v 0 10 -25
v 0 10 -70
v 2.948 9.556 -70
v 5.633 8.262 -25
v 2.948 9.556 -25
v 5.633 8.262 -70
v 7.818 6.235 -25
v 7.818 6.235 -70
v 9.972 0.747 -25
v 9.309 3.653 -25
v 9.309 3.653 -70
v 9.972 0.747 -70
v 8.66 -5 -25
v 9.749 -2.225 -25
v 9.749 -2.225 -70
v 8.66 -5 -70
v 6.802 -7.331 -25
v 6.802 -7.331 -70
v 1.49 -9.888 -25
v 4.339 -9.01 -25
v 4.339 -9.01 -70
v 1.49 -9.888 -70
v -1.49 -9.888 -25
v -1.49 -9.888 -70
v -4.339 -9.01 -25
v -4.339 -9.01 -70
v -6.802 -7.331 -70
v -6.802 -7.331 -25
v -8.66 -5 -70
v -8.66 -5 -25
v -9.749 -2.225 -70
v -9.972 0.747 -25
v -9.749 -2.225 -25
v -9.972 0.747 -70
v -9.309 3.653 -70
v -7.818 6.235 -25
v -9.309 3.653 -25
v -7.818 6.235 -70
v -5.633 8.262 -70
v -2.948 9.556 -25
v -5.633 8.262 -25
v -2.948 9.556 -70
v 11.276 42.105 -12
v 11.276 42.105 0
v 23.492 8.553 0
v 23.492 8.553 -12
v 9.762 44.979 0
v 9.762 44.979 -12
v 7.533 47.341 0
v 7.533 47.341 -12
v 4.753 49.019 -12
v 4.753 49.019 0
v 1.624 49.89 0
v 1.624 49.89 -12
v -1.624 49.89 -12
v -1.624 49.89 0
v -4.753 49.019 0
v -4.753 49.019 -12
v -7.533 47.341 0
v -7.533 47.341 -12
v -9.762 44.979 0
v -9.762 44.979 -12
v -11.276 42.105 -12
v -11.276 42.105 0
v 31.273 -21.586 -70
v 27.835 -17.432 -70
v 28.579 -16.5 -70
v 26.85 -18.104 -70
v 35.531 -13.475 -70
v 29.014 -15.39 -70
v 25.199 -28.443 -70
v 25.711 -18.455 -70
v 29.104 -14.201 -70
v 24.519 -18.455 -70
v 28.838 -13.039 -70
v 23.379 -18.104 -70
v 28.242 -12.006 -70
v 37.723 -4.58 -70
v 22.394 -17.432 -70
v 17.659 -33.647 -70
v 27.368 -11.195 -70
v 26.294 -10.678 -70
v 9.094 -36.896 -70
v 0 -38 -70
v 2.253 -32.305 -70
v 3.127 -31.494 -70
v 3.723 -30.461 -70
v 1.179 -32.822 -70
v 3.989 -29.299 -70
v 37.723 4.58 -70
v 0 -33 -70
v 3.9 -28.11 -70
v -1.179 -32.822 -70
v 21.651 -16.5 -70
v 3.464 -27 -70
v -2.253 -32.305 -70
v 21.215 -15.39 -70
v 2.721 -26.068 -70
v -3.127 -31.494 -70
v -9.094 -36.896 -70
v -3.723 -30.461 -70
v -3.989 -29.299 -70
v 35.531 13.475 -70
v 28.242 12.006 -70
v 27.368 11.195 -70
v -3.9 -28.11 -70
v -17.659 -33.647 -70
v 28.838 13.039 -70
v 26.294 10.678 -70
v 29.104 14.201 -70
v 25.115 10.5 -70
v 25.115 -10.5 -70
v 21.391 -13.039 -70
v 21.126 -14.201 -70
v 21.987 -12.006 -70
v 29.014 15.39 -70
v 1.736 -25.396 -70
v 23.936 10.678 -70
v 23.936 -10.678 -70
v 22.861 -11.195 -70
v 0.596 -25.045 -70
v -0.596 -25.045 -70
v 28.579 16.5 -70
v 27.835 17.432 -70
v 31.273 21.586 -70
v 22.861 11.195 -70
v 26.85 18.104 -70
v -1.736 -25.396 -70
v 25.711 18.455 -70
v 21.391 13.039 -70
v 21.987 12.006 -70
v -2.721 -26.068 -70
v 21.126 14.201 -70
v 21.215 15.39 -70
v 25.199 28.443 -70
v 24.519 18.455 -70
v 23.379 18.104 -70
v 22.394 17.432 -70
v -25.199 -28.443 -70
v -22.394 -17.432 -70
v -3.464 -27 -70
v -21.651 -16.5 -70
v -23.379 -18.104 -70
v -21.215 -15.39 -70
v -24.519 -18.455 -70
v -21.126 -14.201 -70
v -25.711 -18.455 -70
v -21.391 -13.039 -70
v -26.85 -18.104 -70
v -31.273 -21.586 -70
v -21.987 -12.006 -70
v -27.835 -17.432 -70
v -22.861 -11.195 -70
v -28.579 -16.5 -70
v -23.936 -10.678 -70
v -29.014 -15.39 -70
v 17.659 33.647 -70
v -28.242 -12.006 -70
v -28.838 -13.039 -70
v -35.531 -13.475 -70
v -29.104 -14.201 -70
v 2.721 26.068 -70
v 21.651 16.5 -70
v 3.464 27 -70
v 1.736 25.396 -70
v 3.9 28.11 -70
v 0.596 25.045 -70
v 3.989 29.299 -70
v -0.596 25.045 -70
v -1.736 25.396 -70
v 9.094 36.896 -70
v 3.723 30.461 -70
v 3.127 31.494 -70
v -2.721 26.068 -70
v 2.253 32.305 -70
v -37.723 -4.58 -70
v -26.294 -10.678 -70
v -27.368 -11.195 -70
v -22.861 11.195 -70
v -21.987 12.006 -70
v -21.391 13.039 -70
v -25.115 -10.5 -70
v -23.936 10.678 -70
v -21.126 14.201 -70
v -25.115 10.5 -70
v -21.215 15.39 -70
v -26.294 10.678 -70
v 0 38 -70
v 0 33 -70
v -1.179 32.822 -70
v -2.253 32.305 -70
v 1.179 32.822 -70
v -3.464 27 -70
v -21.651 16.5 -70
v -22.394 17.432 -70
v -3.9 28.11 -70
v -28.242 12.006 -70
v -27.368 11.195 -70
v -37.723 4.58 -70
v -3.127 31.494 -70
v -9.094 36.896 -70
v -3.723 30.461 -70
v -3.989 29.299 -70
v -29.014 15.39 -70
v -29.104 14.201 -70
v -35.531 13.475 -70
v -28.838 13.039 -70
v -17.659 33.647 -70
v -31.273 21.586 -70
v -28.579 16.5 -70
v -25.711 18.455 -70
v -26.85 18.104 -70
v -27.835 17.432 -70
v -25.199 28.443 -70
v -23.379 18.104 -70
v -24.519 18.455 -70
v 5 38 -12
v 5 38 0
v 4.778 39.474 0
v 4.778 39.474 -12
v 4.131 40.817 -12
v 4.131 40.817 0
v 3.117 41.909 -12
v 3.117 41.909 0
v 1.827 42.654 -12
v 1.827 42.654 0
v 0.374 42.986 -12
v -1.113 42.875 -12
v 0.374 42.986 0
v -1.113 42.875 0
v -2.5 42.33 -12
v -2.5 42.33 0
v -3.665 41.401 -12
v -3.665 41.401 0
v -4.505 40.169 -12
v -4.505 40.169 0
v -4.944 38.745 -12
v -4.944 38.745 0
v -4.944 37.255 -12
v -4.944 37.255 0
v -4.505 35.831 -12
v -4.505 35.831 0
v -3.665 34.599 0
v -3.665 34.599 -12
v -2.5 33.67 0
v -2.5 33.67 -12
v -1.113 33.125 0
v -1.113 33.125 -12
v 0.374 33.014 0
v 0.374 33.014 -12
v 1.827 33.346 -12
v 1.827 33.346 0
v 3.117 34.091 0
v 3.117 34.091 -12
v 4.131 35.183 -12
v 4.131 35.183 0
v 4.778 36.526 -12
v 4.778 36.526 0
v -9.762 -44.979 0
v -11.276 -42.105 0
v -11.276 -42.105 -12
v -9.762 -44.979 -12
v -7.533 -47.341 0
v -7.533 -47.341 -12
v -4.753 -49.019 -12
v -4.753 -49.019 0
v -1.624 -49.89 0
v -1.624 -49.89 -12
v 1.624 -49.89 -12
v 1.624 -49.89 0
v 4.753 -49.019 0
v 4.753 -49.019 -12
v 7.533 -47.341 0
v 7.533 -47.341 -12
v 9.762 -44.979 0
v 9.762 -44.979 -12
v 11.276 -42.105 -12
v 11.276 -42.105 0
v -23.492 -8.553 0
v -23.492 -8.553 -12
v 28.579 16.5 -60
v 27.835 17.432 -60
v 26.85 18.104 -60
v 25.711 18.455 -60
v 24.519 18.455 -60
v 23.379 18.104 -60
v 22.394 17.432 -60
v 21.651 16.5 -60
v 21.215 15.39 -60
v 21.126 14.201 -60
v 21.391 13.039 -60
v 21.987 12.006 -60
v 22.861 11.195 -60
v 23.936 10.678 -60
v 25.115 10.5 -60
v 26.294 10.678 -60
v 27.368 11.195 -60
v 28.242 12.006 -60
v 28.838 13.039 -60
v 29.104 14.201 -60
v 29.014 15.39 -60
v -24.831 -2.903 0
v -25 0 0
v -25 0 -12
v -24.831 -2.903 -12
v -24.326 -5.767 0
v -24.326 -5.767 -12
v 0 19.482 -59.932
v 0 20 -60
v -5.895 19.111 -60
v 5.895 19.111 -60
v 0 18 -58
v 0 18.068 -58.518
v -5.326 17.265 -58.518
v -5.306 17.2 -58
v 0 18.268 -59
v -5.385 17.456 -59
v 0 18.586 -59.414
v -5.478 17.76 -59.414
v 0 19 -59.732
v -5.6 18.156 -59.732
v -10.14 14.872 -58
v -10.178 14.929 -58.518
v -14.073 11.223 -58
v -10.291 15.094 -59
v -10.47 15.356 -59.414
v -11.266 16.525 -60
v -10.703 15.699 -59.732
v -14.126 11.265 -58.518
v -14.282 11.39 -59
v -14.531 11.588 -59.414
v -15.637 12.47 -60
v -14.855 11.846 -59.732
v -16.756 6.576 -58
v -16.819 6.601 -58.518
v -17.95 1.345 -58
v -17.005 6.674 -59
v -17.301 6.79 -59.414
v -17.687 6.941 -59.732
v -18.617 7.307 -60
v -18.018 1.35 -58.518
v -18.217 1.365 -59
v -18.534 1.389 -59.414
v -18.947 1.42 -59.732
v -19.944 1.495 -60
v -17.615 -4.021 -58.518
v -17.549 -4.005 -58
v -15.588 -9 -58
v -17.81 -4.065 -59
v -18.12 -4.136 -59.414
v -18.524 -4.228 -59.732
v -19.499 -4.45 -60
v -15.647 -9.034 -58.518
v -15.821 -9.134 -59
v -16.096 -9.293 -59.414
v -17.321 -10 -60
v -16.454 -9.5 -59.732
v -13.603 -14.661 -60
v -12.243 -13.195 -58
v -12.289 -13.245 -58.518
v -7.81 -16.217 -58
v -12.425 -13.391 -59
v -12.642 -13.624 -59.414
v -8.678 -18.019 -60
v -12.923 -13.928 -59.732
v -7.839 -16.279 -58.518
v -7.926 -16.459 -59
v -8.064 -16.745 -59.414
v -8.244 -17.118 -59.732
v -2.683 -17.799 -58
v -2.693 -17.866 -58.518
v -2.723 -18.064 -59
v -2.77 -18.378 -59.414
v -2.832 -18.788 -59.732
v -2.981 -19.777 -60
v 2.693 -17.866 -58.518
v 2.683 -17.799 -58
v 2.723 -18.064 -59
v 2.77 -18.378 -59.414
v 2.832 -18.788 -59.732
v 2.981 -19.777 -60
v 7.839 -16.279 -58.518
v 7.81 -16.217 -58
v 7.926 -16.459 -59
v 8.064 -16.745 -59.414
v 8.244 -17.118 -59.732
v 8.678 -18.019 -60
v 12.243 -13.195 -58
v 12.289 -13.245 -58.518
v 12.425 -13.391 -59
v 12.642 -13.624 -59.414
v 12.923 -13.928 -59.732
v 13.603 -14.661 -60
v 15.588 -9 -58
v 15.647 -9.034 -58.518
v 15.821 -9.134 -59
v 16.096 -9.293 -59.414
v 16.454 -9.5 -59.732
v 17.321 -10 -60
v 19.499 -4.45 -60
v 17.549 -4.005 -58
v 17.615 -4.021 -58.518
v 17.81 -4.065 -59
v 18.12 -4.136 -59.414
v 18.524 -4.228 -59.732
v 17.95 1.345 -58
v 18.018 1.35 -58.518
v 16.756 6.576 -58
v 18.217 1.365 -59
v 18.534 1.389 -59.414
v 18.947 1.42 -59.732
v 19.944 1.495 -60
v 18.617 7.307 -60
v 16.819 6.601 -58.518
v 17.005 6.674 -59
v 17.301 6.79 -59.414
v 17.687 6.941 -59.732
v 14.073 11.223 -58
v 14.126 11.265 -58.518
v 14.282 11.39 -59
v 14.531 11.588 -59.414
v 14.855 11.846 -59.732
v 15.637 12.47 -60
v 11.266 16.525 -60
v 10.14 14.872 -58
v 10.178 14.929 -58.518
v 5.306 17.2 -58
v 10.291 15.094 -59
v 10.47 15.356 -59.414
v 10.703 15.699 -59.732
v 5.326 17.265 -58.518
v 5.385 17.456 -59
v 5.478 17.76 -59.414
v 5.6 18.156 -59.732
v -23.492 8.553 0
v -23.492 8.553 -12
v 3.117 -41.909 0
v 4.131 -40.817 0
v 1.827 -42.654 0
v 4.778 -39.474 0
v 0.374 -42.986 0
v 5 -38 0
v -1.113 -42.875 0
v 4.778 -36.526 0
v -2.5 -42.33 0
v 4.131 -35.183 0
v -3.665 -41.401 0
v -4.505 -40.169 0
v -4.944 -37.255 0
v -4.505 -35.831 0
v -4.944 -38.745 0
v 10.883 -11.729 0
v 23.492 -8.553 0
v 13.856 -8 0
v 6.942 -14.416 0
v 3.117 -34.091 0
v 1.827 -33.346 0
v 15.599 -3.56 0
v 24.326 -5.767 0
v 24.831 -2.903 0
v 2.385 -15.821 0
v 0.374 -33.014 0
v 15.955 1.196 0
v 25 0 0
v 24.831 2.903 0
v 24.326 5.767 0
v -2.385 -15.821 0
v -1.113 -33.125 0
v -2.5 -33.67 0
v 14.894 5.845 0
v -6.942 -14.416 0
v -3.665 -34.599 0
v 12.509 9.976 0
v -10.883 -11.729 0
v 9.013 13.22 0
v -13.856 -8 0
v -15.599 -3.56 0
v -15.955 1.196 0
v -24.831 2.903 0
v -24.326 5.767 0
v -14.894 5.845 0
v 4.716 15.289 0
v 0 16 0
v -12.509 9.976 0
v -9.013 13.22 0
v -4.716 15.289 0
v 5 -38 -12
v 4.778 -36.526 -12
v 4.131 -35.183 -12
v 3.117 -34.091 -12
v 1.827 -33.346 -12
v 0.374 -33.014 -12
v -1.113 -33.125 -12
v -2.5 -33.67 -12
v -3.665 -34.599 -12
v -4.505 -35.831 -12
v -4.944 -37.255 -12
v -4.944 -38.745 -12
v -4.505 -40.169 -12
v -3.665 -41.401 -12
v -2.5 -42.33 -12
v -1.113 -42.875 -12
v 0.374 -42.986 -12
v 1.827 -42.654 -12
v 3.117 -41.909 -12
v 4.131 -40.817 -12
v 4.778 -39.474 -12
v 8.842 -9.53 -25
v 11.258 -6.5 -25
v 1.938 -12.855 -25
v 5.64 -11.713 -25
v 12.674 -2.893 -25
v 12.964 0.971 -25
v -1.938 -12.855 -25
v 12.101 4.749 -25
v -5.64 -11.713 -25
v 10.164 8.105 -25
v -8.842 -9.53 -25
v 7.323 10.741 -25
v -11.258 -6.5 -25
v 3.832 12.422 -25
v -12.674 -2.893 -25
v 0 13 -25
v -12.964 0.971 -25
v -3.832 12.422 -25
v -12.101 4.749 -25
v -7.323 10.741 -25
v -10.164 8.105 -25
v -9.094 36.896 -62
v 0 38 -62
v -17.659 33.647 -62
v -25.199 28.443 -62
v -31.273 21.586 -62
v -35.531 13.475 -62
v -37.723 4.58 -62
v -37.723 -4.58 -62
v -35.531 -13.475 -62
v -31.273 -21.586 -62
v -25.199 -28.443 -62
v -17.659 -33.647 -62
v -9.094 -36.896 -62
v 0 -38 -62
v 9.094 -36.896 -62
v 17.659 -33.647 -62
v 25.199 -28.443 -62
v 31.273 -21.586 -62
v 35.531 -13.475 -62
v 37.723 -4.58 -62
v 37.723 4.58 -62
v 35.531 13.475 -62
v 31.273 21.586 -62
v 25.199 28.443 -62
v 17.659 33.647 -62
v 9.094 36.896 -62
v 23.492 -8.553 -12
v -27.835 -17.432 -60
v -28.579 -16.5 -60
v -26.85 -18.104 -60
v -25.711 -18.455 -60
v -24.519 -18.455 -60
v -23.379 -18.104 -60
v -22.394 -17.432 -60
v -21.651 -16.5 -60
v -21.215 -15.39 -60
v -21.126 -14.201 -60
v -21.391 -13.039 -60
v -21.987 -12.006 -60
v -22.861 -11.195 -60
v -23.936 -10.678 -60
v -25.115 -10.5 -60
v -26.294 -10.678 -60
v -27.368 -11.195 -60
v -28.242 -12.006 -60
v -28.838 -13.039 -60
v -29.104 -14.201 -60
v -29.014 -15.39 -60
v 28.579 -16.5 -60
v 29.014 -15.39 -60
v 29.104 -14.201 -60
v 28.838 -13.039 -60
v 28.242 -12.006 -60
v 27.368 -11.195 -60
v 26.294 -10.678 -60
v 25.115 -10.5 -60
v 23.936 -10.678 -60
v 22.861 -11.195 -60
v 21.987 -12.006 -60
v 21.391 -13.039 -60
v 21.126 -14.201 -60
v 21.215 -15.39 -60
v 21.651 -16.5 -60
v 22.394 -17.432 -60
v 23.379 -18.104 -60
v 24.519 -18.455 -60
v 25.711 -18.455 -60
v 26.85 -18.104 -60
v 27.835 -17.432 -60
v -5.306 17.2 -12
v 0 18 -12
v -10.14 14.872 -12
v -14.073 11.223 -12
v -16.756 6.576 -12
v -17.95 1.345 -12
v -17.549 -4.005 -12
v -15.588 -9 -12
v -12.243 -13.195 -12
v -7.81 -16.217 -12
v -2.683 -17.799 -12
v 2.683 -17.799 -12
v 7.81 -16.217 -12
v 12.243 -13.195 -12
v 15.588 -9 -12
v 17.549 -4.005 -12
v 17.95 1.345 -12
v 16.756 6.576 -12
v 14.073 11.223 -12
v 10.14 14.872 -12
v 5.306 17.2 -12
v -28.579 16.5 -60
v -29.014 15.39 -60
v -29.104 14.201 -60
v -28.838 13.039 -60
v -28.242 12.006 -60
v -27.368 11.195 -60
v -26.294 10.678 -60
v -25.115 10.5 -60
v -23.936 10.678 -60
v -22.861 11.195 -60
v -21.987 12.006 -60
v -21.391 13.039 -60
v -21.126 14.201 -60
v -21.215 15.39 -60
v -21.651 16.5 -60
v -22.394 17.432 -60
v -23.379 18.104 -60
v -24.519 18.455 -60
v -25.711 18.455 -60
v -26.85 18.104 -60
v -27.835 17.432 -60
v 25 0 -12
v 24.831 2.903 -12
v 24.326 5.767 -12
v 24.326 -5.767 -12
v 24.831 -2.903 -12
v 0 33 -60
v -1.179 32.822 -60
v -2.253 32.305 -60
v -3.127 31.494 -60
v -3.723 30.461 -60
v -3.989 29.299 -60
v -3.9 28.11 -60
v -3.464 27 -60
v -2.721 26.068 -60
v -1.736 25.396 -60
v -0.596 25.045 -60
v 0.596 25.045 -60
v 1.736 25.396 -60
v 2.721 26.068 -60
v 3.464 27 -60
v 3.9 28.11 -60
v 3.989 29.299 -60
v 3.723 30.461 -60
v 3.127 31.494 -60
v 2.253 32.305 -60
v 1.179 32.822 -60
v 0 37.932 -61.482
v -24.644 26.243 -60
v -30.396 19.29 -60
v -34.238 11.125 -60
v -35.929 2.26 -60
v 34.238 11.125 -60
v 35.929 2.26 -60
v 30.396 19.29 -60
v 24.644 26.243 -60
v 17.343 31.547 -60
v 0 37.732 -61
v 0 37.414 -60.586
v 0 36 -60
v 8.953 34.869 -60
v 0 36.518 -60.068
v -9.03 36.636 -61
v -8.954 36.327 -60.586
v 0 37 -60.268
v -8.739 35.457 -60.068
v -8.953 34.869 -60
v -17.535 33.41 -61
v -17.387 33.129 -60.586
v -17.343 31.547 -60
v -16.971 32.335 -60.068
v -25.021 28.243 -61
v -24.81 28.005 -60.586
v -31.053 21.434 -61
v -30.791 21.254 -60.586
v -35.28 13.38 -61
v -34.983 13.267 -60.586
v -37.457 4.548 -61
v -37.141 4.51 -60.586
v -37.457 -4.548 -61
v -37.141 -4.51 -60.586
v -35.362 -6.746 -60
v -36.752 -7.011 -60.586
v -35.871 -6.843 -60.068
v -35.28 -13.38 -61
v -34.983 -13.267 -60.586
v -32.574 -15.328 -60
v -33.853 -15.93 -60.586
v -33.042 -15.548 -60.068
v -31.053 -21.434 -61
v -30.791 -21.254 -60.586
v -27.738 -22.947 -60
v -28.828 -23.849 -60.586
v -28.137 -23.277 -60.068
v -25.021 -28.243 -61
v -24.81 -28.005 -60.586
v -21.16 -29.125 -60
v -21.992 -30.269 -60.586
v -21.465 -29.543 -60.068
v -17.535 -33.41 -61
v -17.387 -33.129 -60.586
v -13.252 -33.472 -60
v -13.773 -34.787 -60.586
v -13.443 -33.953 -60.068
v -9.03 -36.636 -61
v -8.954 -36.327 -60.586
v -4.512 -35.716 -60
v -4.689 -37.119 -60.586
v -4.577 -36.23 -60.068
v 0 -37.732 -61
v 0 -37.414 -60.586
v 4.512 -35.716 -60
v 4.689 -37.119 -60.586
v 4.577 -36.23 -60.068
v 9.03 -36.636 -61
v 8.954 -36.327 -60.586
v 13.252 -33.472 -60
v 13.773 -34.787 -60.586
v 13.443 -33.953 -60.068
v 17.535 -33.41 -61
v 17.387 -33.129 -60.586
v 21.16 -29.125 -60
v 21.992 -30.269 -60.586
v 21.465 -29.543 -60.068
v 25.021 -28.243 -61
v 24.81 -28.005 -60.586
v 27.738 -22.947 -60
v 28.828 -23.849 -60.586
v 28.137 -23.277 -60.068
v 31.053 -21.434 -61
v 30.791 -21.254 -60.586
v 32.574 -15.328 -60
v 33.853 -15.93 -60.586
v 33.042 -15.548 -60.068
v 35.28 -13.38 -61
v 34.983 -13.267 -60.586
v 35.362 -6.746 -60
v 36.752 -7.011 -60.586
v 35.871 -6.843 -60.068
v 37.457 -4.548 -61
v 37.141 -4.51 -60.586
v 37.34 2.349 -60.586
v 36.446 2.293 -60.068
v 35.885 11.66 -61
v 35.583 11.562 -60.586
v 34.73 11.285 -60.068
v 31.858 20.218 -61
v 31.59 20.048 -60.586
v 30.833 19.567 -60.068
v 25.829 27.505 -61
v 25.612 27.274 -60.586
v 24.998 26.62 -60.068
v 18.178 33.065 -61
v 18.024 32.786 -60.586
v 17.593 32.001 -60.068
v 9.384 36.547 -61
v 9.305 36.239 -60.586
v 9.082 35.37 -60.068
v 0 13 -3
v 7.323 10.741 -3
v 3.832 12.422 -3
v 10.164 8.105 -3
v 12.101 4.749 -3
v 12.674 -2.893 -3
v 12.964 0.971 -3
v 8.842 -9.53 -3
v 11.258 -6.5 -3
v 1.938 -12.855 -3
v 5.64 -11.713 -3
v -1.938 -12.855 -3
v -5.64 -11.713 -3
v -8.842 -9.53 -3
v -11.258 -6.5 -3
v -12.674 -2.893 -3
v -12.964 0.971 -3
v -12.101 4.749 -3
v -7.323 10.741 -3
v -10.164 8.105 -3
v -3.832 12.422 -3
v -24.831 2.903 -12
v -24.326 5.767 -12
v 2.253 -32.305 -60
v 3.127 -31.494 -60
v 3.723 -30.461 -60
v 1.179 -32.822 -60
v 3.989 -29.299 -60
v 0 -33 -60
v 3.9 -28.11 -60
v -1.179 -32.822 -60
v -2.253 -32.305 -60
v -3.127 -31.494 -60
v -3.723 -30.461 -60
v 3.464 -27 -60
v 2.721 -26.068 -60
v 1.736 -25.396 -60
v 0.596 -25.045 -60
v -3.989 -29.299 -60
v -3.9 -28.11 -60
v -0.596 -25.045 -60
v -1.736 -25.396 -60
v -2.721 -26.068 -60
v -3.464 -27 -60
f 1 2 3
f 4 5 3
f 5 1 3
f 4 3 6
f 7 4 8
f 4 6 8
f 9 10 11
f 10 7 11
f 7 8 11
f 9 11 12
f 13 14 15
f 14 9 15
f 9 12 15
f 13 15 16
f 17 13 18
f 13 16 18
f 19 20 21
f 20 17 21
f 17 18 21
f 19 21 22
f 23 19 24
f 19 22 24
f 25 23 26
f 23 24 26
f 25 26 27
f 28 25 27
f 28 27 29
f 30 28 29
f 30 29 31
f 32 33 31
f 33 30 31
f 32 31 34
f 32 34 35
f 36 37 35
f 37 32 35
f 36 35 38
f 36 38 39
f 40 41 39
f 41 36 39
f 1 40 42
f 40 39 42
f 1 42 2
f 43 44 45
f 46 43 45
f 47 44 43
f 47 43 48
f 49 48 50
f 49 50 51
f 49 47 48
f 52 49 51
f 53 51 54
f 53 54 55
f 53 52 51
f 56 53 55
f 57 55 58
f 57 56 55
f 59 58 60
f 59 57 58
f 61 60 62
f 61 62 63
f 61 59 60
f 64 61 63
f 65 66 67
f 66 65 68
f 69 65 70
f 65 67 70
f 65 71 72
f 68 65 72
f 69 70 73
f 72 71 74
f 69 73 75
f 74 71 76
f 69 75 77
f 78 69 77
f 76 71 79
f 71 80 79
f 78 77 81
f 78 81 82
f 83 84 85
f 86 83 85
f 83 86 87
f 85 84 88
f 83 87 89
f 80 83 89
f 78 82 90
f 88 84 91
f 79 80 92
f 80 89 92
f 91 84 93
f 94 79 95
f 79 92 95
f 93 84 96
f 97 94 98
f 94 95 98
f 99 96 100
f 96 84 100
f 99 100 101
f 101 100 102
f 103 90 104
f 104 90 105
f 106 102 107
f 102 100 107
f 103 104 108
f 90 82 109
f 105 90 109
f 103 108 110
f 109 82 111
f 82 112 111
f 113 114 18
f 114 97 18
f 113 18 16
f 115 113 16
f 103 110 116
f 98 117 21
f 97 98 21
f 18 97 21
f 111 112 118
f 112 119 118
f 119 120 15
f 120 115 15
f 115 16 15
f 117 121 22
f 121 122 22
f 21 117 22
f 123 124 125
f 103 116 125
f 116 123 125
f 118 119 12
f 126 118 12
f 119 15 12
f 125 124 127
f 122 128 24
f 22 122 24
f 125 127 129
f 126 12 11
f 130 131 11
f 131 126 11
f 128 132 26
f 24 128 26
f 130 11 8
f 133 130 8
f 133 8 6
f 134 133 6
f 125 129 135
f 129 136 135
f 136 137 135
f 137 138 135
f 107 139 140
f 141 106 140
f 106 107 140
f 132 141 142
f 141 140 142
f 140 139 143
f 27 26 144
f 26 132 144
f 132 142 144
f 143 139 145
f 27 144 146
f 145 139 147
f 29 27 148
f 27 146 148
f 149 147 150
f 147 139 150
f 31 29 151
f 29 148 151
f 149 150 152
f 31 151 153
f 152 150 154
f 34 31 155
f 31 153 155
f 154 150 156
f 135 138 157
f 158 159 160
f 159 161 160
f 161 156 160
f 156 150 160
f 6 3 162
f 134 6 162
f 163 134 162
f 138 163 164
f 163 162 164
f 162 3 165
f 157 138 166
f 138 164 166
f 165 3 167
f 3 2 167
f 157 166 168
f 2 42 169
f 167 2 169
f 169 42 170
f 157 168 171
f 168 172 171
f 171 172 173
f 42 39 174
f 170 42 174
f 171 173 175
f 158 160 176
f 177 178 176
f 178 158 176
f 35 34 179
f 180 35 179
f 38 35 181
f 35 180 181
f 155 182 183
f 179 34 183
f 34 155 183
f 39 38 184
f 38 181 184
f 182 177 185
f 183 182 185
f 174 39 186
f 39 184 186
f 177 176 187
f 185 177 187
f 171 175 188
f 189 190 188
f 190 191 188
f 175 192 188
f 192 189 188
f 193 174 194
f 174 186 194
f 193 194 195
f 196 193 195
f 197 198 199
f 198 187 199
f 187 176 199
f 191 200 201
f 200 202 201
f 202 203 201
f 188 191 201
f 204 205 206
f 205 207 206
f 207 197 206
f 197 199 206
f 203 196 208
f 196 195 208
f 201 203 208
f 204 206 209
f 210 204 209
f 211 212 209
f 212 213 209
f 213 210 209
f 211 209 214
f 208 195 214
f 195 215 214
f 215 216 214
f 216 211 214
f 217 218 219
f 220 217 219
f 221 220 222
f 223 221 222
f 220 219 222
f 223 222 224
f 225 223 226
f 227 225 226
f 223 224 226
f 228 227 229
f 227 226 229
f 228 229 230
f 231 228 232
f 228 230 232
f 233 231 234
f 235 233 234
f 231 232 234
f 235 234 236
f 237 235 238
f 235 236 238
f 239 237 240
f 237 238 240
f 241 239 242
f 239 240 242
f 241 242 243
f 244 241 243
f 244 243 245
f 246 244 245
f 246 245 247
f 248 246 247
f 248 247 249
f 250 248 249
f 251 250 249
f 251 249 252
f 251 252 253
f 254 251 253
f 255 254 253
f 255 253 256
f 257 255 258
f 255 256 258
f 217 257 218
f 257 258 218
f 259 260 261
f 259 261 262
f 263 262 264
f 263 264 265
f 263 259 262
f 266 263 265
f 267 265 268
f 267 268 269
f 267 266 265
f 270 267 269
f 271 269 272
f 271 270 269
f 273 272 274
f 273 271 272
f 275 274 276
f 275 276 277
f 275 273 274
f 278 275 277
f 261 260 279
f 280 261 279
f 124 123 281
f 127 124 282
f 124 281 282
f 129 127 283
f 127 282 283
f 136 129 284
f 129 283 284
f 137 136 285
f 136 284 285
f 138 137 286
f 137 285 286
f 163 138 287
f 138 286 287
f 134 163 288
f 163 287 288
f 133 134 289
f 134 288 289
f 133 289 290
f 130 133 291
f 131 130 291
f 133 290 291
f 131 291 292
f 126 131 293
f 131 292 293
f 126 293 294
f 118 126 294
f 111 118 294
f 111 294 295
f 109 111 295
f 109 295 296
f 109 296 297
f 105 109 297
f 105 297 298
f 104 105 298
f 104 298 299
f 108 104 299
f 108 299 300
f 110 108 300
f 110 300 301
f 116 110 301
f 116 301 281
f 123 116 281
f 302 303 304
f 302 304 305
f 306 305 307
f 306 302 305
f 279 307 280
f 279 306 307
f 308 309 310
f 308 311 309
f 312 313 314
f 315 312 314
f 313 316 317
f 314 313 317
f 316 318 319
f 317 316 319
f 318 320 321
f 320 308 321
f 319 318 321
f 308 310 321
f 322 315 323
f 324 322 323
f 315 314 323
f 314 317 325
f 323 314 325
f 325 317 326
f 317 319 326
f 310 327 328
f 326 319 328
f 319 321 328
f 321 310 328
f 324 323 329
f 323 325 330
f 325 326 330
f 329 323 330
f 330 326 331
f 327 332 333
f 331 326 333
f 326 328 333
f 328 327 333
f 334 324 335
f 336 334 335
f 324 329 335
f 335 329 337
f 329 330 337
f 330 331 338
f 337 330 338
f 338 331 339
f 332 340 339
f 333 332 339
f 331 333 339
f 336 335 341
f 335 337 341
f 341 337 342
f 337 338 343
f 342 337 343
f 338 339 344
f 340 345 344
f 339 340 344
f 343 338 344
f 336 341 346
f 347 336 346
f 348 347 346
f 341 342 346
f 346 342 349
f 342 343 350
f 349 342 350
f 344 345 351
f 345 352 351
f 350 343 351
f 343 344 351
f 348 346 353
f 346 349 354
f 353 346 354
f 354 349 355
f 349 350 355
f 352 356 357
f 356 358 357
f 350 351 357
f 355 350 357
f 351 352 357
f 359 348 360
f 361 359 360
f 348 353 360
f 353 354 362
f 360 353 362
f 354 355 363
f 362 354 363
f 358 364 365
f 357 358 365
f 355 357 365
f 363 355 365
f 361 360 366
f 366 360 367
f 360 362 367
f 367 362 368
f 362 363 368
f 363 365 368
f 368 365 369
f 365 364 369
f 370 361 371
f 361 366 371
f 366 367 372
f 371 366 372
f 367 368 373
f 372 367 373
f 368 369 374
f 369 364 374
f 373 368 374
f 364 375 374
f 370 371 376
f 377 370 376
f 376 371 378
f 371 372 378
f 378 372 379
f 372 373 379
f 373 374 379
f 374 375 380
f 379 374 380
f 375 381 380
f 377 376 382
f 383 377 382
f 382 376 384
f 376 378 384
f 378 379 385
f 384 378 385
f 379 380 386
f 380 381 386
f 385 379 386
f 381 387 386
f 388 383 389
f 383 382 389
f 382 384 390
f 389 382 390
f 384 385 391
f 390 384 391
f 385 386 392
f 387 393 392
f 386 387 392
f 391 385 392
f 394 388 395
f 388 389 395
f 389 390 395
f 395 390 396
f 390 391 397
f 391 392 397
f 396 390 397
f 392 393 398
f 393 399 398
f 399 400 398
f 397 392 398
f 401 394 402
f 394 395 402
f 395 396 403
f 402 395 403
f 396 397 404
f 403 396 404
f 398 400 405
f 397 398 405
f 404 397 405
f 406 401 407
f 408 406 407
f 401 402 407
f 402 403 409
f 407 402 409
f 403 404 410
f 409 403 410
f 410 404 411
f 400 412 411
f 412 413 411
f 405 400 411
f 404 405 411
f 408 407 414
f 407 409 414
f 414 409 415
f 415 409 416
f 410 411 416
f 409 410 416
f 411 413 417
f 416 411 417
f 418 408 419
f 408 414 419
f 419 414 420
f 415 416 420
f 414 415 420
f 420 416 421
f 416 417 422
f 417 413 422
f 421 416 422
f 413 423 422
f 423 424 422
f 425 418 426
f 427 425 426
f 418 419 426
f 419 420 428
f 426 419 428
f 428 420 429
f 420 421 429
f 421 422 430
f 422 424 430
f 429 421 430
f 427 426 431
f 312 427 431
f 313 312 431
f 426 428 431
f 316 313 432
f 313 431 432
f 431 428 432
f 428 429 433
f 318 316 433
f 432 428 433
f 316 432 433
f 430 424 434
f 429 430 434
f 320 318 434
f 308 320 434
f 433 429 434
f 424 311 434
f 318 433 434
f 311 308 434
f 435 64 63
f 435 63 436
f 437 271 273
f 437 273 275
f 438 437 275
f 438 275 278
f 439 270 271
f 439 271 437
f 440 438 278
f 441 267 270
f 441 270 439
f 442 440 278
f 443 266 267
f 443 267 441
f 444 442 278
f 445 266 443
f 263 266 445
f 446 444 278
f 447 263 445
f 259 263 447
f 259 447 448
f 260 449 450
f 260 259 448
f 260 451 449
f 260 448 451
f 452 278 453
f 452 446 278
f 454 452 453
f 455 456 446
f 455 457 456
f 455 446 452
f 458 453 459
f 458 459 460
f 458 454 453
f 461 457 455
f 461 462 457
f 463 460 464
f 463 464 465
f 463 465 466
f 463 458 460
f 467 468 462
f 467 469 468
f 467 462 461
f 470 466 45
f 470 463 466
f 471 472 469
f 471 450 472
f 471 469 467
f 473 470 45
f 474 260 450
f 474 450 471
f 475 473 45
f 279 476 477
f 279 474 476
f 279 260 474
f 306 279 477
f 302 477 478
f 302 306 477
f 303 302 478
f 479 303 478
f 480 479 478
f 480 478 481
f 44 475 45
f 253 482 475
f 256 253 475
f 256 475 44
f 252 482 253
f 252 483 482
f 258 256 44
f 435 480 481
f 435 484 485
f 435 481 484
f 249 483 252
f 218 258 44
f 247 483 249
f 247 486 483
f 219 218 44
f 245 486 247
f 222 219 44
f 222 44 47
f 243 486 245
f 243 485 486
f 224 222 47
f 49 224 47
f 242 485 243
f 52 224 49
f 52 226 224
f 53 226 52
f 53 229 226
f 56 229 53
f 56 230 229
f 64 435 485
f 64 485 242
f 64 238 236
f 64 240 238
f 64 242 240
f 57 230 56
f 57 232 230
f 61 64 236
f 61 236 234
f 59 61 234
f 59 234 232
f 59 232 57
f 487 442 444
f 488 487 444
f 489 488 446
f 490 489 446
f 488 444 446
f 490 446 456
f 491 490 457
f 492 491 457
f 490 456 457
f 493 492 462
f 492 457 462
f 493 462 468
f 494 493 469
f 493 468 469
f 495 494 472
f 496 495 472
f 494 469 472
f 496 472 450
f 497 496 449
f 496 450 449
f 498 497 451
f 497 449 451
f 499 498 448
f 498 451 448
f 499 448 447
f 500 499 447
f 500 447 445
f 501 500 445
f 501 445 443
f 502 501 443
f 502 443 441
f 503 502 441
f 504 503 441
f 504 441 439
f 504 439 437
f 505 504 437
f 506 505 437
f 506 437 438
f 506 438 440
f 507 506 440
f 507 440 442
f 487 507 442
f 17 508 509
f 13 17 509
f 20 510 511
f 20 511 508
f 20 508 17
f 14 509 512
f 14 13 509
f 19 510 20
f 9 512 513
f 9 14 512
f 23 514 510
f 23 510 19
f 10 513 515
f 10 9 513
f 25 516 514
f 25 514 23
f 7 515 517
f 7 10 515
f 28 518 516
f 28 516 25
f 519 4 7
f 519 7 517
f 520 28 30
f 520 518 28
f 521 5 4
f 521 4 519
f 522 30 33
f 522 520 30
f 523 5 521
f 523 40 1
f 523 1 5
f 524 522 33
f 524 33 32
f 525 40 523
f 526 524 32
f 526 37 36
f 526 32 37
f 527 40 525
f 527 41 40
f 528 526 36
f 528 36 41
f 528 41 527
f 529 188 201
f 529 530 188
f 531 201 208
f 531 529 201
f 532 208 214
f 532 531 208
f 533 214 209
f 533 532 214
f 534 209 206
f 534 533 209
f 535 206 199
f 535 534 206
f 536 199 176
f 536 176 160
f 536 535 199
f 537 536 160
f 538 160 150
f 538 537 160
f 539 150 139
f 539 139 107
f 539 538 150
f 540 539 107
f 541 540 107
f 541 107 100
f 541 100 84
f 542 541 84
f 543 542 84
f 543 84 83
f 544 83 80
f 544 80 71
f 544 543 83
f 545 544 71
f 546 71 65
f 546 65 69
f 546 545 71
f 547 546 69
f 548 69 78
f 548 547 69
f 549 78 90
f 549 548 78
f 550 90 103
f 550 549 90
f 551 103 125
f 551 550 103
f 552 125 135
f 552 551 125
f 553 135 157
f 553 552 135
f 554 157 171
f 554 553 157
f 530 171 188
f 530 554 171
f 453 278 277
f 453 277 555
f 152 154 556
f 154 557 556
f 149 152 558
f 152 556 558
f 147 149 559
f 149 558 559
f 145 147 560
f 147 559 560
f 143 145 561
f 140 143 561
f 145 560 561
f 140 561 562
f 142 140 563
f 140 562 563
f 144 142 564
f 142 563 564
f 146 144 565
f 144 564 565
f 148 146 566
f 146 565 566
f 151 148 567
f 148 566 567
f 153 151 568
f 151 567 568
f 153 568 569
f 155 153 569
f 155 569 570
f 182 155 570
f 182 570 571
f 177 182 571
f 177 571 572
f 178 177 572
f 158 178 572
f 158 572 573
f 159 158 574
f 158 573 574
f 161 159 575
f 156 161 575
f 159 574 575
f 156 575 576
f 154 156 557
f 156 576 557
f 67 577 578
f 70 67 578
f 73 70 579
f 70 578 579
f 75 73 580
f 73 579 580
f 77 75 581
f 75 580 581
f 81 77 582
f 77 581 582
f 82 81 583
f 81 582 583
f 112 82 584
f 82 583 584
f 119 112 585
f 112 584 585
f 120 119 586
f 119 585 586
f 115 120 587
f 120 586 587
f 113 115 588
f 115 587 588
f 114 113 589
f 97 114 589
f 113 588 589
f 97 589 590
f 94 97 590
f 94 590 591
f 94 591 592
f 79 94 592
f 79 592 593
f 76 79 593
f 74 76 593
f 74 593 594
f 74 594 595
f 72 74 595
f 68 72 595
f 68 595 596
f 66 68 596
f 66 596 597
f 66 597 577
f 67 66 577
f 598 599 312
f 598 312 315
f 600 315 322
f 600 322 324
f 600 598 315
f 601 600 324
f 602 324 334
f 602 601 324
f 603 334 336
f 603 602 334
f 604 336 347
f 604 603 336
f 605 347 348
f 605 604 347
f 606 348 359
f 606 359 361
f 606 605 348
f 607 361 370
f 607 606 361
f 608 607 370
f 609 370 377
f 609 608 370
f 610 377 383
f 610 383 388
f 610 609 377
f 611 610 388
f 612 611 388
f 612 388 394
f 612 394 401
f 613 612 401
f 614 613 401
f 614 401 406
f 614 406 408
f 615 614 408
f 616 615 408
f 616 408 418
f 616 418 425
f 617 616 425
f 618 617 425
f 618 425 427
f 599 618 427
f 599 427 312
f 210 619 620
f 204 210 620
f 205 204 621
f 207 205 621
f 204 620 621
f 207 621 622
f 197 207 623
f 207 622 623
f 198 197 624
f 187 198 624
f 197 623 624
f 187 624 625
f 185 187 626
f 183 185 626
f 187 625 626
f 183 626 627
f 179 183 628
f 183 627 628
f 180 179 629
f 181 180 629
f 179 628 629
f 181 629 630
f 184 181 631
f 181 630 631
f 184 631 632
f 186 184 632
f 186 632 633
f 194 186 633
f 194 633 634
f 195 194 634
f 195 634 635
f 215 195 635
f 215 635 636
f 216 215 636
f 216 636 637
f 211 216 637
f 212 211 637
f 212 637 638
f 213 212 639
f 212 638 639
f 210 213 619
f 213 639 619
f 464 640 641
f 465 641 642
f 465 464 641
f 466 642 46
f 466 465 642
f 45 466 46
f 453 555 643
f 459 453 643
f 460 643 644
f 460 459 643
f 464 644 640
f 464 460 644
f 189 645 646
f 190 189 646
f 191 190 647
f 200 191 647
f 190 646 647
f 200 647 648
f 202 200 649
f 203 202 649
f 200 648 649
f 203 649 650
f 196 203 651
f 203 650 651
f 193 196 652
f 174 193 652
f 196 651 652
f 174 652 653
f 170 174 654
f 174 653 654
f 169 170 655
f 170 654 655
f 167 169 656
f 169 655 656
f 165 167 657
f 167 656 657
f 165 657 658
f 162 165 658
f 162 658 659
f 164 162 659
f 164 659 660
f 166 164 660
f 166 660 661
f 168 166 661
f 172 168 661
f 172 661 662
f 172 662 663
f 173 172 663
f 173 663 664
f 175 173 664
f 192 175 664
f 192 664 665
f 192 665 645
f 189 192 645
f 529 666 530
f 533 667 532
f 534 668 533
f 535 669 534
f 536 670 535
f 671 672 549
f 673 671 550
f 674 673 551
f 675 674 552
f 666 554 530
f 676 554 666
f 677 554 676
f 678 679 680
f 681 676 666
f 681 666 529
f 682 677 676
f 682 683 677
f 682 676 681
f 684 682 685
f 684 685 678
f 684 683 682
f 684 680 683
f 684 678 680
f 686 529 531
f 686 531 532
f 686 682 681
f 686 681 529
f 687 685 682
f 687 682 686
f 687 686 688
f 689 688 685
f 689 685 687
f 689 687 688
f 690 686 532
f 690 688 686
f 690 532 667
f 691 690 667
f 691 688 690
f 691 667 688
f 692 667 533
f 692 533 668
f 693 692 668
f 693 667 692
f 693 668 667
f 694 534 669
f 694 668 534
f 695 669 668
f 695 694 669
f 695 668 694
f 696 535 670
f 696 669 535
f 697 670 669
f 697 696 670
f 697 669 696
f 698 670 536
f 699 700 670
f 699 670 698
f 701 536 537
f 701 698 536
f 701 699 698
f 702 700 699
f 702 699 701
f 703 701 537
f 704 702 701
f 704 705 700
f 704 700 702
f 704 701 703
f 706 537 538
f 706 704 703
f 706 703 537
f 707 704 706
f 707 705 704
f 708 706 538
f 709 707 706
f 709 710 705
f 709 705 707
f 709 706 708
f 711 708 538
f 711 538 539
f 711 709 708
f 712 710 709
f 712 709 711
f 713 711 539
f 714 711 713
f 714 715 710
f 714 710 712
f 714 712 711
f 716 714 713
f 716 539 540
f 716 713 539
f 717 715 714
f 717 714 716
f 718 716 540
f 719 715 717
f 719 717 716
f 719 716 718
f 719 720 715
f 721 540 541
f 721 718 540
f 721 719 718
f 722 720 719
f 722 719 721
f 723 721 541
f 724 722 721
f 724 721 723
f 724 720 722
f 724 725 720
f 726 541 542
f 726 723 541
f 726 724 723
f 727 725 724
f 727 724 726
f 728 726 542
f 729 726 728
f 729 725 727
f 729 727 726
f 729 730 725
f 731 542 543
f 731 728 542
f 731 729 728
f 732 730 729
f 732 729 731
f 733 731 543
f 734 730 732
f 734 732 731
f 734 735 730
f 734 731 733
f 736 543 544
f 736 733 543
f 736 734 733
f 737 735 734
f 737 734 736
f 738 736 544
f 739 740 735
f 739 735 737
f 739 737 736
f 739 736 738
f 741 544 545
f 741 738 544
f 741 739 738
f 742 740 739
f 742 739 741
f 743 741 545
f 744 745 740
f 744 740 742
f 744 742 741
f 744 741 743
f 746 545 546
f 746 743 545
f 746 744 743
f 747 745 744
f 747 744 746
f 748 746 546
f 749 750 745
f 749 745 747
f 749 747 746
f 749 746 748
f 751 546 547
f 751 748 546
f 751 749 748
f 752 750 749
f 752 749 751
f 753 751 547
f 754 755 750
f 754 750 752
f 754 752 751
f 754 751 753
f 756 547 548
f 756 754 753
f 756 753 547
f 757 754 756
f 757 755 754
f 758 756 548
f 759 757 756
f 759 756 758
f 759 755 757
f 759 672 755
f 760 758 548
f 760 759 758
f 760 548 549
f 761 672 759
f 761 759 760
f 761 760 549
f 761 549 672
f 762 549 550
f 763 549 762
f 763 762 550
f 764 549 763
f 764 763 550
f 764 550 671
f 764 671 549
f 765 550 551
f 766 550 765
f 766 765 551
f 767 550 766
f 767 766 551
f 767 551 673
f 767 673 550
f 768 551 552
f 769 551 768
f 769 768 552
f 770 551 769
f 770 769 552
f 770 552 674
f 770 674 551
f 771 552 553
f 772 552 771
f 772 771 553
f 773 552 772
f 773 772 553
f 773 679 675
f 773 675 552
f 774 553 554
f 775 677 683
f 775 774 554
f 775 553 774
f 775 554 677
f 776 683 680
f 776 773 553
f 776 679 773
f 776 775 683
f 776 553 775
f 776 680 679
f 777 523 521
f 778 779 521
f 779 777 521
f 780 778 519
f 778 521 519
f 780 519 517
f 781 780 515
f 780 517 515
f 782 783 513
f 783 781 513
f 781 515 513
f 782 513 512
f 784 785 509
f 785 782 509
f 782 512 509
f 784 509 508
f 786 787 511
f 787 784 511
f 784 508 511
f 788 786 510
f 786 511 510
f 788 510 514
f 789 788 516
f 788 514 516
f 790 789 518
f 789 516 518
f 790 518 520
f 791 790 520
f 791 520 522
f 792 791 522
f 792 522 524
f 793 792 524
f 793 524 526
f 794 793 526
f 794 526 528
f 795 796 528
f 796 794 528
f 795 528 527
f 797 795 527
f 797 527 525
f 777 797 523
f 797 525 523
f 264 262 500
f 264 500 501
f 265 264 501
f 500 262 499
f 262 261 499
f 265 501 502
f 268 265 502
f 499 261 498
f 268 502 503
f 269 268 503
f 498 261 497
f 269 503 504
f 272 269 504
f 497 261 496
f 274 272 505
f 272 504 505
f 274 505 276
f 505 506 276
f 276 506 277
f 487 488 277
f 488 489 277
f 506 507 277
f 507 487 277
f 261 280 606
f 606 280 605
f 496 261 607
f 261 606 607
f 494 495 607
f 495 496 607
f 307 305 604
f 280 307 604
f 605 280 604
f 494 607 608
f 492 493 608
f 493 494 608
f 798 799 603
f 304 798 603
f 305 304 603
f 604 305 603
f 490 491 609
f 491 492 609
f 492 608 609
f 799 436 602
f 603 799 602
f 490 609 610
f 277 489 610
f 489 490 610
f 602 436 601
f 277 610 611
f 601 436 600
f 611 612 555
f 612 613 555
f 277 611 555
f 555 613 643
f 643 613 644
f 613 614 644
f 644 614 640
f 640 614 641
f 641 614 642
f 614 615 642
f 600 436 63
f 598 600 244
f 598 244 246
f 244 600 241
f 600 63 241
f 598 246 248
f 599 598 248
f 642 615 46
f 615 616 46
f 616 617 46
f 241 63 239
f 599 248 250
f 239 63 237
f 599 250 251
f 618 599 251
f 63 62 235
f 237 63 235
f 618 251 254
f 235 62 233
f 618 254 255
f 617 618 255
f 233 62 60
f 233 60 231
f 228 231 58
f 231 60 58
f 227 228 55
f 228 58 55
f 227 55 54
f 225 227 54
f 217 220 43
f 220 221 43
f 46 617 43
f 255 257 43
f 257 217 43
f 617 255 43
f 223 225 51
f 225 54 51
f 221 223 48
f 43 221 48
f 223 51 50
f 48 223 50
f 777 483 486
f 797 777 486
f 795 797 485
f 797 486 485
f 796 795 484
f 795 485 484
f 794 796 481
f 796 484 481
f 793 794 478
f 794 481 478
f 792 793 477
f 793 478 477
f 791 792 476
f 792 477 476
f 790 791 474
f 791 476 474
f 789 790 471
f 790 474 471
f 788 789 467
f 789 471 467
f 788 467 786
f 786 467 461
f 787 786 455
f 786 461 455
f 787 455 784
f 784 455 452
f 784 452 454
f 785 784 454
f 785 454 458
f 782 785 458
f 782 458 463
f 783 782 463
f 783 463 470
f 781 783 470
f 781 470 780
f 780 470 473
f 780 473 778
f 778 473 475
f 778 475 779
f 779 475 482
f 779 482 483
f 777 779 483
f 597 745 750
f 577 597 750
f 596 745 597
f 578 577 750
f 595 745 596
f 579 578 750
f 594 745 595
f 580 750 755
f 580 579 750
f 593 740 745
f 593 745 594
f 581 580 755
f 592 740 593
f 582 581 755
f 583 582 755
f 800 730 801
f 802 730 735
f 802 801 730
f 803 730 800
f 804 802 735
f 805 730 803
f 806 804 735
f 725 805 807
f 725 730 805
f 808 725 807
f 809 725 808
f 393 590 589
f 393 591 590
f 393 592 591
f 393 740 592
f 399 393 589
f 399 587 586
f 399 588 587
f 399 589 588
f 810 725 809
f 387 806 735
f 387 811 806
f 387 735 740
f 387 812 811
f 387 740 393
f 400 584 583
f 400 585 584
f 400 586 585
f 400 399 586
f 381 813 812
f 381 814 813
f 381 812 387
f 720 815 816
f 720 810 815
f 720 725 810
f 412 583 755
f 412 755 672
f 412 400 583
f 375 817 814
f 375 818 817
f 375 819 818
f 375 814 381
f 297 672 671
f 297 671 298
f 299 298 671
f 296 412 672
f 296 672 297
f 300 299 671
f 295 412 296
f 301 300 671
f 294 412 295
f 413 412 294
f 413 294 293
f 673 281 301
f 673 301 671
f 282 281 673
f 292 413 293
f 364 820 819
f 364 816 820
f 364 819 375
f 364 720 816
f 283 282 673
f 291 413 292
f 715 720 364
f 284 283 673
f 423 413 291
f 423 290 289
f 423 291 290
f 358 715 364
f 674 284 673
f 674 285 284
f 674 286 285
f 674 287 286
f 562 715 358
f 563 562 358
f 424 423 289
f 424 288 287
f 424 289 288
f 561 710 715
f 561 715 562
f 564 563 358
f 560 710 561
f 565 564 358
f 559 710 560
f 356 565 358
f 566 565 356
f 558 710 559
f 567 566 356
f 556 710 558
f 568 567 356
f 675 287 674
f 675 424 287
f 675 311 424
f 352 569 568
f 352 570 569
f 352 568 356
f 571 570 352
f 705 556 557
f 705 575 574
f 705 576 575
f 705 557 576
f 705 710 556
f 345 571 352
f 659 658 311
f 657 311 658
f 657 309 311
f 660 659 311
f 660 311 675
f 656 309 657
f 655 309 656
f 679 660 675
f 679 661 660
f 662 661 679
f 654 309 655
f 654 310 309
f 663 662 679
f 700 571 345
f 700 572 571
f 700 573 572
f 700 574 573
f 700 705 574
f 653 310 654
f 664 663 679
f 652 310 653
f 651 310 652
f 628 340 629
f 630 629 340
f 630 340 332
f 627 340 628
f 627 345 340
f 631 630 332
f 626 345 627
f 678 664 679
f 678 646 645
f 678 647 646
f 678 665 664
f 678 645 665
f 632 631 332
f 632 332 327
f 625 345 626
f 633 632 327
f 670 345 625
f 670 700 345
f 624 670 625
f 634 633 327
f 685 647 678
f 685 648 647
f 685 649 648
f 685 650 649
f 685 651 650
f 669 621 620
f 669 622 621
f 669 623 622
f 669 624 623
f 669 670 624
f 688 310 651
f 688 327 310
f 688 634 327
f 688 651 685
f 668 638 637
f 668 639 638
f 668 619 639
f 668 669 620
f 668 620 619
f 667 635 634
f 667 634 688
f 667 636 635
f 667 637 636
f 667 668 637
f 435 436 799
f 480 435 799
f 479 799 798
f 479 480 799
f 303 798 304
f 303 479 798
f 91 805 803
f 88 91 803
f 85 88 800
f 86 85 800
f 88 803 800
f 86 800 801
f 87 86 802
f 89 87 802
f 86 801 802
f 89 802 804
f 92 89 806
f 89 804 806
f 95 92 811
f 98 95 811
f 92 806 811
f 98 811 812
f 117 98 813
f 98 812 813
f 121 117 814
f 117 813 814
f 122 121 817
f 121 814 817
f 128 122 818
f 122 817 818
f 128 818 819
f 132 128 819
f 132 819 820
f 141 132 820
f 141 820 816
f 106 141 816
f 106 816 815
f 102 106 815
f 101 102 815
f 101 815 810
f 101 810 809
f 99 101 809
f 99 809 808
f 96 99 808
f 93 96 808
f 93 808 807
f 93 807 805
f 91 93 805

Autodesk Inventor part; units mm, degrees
ref_plane "YZ Plane" through (0, 0, 0) normal (1, 0, 0) x (0, 1, 0)
ref_plane "XZ Plane" through (0, 0, 0) normal (0, 1, 0) x (-1, 0, 0)
ref_plane "XY Plane" through (0, 0, 0) normal (0, 0, 1) x (1, 0, 0)
sketch "Boceto1" plane through (0, 0, 0) normal (1, 0, 0) x (0, 1, 0)
  line L0 (10, -25) -> (10, -70)
  line L1 (10, -70) -> (38, -70)
  line L2 (38, -70) -> (38, -60)
  line L3 (38, -60) -> (18, -60)
  line L4 (18, -60) -> (18, 0)
  line L5 (18, 0) -> (13, 0)
  line L6 (-7.6, 0) -> (45.6, 0) construction
  line L7 (0, -84) -> (0, 14) projected
  line L8 (13, 0) -> (13, -25)
  line L9 (13, -25) -> (10, -25)
  point P0 (0, 0)
  dimension "d6" = 20
  dimension "d8" = 36
  dimension "d9" = 10
  dimension "d10" = 76
  dimension "d11" = 26
  dimension "d12" = 25
  dimension "d35" = 70
revolve "Revolución1" add sketch "Boceto1" angle 360 about axis through (0, 0, -10) along (0, 0, 1)
sketch "Boceto2" plane through (0, 0, 0) normal (0, 0, 1) x (1, 0, 0)
  line L0 (-53.2, 0) -> (53.2, 0) construction
  line L1 (0, -70) -> (0, 70) construction
  arc A0 (11.2759, 42.1053) -> (-11.2759, 42.1053) centre (0, 38) ccw
  line L2 (-11.2759, 42.1053) -> (-23.4915, 8.5526)
  line L3 (11.2759, 42.1053) -> (23.4915, 8.5526)
  arc A1 (-23.4915, 8.5526) -> (-25, 0) centre (0, 0) ccw
  arc A2 (25, 0) -> (23.4915, 8.5526) centre (0, 0) ccw
  circle A3 centre (0, 38) radius 5
  arc A4 (-11.2759, -42.1053) -> (11.2759, -42.1053) centre (0, -38) ccw
  line L4 (-11.2759, -42.1053) -> (-23.4915, -8.5526)
  line L5 (11.2759, -42.1053) -> (23.4915, -8.5526)
  arc A5 (-25, 0) -> (-23.4915, -8.5526) centre (0, 0) ccw
  arc A6 (23.4915, -8.5526) -> (25, 0) centre (0, 0) ccw
  circle A7 centre (0, -38) radius 5
  circle A8 centre (0, 0) radius 13
  dimension "d14" = 12
  dimension "d15" = 25
  dimension "d16" = 38
  dimension "d17" = 10
extrude "Extrusión1" add sketch "Boceto2" against normal blind 12
sketch "Boceto3" plane through (0, 0, -70) normal (0, 0, -1) x (-1, 0, 0)
  circle A0 centre (0, 0) radius 29 construction
  point P0 (0, 29)
  dimension "d20" = 58
hole "Agujero1" at (0, 29, -70) direction (0, 0, 1) diameter 8 depth 10
pattern_circular "Patrón circular1" count 6 over 360 about axis through (0, 0, -10) along (0, 0, 1) of "Agujero1"
chamfer "Chaflán1" distance 3 angle 45 1 edges at (0, -13, 0) measured on face at (11.9516, -17.6559, 0)
fillet "Empalme1" radius 2 2 edges at (0, -18, -60) (0, -38, -60)
properties part number "Lab6A01209499P1" material "Hierro, fundido"
